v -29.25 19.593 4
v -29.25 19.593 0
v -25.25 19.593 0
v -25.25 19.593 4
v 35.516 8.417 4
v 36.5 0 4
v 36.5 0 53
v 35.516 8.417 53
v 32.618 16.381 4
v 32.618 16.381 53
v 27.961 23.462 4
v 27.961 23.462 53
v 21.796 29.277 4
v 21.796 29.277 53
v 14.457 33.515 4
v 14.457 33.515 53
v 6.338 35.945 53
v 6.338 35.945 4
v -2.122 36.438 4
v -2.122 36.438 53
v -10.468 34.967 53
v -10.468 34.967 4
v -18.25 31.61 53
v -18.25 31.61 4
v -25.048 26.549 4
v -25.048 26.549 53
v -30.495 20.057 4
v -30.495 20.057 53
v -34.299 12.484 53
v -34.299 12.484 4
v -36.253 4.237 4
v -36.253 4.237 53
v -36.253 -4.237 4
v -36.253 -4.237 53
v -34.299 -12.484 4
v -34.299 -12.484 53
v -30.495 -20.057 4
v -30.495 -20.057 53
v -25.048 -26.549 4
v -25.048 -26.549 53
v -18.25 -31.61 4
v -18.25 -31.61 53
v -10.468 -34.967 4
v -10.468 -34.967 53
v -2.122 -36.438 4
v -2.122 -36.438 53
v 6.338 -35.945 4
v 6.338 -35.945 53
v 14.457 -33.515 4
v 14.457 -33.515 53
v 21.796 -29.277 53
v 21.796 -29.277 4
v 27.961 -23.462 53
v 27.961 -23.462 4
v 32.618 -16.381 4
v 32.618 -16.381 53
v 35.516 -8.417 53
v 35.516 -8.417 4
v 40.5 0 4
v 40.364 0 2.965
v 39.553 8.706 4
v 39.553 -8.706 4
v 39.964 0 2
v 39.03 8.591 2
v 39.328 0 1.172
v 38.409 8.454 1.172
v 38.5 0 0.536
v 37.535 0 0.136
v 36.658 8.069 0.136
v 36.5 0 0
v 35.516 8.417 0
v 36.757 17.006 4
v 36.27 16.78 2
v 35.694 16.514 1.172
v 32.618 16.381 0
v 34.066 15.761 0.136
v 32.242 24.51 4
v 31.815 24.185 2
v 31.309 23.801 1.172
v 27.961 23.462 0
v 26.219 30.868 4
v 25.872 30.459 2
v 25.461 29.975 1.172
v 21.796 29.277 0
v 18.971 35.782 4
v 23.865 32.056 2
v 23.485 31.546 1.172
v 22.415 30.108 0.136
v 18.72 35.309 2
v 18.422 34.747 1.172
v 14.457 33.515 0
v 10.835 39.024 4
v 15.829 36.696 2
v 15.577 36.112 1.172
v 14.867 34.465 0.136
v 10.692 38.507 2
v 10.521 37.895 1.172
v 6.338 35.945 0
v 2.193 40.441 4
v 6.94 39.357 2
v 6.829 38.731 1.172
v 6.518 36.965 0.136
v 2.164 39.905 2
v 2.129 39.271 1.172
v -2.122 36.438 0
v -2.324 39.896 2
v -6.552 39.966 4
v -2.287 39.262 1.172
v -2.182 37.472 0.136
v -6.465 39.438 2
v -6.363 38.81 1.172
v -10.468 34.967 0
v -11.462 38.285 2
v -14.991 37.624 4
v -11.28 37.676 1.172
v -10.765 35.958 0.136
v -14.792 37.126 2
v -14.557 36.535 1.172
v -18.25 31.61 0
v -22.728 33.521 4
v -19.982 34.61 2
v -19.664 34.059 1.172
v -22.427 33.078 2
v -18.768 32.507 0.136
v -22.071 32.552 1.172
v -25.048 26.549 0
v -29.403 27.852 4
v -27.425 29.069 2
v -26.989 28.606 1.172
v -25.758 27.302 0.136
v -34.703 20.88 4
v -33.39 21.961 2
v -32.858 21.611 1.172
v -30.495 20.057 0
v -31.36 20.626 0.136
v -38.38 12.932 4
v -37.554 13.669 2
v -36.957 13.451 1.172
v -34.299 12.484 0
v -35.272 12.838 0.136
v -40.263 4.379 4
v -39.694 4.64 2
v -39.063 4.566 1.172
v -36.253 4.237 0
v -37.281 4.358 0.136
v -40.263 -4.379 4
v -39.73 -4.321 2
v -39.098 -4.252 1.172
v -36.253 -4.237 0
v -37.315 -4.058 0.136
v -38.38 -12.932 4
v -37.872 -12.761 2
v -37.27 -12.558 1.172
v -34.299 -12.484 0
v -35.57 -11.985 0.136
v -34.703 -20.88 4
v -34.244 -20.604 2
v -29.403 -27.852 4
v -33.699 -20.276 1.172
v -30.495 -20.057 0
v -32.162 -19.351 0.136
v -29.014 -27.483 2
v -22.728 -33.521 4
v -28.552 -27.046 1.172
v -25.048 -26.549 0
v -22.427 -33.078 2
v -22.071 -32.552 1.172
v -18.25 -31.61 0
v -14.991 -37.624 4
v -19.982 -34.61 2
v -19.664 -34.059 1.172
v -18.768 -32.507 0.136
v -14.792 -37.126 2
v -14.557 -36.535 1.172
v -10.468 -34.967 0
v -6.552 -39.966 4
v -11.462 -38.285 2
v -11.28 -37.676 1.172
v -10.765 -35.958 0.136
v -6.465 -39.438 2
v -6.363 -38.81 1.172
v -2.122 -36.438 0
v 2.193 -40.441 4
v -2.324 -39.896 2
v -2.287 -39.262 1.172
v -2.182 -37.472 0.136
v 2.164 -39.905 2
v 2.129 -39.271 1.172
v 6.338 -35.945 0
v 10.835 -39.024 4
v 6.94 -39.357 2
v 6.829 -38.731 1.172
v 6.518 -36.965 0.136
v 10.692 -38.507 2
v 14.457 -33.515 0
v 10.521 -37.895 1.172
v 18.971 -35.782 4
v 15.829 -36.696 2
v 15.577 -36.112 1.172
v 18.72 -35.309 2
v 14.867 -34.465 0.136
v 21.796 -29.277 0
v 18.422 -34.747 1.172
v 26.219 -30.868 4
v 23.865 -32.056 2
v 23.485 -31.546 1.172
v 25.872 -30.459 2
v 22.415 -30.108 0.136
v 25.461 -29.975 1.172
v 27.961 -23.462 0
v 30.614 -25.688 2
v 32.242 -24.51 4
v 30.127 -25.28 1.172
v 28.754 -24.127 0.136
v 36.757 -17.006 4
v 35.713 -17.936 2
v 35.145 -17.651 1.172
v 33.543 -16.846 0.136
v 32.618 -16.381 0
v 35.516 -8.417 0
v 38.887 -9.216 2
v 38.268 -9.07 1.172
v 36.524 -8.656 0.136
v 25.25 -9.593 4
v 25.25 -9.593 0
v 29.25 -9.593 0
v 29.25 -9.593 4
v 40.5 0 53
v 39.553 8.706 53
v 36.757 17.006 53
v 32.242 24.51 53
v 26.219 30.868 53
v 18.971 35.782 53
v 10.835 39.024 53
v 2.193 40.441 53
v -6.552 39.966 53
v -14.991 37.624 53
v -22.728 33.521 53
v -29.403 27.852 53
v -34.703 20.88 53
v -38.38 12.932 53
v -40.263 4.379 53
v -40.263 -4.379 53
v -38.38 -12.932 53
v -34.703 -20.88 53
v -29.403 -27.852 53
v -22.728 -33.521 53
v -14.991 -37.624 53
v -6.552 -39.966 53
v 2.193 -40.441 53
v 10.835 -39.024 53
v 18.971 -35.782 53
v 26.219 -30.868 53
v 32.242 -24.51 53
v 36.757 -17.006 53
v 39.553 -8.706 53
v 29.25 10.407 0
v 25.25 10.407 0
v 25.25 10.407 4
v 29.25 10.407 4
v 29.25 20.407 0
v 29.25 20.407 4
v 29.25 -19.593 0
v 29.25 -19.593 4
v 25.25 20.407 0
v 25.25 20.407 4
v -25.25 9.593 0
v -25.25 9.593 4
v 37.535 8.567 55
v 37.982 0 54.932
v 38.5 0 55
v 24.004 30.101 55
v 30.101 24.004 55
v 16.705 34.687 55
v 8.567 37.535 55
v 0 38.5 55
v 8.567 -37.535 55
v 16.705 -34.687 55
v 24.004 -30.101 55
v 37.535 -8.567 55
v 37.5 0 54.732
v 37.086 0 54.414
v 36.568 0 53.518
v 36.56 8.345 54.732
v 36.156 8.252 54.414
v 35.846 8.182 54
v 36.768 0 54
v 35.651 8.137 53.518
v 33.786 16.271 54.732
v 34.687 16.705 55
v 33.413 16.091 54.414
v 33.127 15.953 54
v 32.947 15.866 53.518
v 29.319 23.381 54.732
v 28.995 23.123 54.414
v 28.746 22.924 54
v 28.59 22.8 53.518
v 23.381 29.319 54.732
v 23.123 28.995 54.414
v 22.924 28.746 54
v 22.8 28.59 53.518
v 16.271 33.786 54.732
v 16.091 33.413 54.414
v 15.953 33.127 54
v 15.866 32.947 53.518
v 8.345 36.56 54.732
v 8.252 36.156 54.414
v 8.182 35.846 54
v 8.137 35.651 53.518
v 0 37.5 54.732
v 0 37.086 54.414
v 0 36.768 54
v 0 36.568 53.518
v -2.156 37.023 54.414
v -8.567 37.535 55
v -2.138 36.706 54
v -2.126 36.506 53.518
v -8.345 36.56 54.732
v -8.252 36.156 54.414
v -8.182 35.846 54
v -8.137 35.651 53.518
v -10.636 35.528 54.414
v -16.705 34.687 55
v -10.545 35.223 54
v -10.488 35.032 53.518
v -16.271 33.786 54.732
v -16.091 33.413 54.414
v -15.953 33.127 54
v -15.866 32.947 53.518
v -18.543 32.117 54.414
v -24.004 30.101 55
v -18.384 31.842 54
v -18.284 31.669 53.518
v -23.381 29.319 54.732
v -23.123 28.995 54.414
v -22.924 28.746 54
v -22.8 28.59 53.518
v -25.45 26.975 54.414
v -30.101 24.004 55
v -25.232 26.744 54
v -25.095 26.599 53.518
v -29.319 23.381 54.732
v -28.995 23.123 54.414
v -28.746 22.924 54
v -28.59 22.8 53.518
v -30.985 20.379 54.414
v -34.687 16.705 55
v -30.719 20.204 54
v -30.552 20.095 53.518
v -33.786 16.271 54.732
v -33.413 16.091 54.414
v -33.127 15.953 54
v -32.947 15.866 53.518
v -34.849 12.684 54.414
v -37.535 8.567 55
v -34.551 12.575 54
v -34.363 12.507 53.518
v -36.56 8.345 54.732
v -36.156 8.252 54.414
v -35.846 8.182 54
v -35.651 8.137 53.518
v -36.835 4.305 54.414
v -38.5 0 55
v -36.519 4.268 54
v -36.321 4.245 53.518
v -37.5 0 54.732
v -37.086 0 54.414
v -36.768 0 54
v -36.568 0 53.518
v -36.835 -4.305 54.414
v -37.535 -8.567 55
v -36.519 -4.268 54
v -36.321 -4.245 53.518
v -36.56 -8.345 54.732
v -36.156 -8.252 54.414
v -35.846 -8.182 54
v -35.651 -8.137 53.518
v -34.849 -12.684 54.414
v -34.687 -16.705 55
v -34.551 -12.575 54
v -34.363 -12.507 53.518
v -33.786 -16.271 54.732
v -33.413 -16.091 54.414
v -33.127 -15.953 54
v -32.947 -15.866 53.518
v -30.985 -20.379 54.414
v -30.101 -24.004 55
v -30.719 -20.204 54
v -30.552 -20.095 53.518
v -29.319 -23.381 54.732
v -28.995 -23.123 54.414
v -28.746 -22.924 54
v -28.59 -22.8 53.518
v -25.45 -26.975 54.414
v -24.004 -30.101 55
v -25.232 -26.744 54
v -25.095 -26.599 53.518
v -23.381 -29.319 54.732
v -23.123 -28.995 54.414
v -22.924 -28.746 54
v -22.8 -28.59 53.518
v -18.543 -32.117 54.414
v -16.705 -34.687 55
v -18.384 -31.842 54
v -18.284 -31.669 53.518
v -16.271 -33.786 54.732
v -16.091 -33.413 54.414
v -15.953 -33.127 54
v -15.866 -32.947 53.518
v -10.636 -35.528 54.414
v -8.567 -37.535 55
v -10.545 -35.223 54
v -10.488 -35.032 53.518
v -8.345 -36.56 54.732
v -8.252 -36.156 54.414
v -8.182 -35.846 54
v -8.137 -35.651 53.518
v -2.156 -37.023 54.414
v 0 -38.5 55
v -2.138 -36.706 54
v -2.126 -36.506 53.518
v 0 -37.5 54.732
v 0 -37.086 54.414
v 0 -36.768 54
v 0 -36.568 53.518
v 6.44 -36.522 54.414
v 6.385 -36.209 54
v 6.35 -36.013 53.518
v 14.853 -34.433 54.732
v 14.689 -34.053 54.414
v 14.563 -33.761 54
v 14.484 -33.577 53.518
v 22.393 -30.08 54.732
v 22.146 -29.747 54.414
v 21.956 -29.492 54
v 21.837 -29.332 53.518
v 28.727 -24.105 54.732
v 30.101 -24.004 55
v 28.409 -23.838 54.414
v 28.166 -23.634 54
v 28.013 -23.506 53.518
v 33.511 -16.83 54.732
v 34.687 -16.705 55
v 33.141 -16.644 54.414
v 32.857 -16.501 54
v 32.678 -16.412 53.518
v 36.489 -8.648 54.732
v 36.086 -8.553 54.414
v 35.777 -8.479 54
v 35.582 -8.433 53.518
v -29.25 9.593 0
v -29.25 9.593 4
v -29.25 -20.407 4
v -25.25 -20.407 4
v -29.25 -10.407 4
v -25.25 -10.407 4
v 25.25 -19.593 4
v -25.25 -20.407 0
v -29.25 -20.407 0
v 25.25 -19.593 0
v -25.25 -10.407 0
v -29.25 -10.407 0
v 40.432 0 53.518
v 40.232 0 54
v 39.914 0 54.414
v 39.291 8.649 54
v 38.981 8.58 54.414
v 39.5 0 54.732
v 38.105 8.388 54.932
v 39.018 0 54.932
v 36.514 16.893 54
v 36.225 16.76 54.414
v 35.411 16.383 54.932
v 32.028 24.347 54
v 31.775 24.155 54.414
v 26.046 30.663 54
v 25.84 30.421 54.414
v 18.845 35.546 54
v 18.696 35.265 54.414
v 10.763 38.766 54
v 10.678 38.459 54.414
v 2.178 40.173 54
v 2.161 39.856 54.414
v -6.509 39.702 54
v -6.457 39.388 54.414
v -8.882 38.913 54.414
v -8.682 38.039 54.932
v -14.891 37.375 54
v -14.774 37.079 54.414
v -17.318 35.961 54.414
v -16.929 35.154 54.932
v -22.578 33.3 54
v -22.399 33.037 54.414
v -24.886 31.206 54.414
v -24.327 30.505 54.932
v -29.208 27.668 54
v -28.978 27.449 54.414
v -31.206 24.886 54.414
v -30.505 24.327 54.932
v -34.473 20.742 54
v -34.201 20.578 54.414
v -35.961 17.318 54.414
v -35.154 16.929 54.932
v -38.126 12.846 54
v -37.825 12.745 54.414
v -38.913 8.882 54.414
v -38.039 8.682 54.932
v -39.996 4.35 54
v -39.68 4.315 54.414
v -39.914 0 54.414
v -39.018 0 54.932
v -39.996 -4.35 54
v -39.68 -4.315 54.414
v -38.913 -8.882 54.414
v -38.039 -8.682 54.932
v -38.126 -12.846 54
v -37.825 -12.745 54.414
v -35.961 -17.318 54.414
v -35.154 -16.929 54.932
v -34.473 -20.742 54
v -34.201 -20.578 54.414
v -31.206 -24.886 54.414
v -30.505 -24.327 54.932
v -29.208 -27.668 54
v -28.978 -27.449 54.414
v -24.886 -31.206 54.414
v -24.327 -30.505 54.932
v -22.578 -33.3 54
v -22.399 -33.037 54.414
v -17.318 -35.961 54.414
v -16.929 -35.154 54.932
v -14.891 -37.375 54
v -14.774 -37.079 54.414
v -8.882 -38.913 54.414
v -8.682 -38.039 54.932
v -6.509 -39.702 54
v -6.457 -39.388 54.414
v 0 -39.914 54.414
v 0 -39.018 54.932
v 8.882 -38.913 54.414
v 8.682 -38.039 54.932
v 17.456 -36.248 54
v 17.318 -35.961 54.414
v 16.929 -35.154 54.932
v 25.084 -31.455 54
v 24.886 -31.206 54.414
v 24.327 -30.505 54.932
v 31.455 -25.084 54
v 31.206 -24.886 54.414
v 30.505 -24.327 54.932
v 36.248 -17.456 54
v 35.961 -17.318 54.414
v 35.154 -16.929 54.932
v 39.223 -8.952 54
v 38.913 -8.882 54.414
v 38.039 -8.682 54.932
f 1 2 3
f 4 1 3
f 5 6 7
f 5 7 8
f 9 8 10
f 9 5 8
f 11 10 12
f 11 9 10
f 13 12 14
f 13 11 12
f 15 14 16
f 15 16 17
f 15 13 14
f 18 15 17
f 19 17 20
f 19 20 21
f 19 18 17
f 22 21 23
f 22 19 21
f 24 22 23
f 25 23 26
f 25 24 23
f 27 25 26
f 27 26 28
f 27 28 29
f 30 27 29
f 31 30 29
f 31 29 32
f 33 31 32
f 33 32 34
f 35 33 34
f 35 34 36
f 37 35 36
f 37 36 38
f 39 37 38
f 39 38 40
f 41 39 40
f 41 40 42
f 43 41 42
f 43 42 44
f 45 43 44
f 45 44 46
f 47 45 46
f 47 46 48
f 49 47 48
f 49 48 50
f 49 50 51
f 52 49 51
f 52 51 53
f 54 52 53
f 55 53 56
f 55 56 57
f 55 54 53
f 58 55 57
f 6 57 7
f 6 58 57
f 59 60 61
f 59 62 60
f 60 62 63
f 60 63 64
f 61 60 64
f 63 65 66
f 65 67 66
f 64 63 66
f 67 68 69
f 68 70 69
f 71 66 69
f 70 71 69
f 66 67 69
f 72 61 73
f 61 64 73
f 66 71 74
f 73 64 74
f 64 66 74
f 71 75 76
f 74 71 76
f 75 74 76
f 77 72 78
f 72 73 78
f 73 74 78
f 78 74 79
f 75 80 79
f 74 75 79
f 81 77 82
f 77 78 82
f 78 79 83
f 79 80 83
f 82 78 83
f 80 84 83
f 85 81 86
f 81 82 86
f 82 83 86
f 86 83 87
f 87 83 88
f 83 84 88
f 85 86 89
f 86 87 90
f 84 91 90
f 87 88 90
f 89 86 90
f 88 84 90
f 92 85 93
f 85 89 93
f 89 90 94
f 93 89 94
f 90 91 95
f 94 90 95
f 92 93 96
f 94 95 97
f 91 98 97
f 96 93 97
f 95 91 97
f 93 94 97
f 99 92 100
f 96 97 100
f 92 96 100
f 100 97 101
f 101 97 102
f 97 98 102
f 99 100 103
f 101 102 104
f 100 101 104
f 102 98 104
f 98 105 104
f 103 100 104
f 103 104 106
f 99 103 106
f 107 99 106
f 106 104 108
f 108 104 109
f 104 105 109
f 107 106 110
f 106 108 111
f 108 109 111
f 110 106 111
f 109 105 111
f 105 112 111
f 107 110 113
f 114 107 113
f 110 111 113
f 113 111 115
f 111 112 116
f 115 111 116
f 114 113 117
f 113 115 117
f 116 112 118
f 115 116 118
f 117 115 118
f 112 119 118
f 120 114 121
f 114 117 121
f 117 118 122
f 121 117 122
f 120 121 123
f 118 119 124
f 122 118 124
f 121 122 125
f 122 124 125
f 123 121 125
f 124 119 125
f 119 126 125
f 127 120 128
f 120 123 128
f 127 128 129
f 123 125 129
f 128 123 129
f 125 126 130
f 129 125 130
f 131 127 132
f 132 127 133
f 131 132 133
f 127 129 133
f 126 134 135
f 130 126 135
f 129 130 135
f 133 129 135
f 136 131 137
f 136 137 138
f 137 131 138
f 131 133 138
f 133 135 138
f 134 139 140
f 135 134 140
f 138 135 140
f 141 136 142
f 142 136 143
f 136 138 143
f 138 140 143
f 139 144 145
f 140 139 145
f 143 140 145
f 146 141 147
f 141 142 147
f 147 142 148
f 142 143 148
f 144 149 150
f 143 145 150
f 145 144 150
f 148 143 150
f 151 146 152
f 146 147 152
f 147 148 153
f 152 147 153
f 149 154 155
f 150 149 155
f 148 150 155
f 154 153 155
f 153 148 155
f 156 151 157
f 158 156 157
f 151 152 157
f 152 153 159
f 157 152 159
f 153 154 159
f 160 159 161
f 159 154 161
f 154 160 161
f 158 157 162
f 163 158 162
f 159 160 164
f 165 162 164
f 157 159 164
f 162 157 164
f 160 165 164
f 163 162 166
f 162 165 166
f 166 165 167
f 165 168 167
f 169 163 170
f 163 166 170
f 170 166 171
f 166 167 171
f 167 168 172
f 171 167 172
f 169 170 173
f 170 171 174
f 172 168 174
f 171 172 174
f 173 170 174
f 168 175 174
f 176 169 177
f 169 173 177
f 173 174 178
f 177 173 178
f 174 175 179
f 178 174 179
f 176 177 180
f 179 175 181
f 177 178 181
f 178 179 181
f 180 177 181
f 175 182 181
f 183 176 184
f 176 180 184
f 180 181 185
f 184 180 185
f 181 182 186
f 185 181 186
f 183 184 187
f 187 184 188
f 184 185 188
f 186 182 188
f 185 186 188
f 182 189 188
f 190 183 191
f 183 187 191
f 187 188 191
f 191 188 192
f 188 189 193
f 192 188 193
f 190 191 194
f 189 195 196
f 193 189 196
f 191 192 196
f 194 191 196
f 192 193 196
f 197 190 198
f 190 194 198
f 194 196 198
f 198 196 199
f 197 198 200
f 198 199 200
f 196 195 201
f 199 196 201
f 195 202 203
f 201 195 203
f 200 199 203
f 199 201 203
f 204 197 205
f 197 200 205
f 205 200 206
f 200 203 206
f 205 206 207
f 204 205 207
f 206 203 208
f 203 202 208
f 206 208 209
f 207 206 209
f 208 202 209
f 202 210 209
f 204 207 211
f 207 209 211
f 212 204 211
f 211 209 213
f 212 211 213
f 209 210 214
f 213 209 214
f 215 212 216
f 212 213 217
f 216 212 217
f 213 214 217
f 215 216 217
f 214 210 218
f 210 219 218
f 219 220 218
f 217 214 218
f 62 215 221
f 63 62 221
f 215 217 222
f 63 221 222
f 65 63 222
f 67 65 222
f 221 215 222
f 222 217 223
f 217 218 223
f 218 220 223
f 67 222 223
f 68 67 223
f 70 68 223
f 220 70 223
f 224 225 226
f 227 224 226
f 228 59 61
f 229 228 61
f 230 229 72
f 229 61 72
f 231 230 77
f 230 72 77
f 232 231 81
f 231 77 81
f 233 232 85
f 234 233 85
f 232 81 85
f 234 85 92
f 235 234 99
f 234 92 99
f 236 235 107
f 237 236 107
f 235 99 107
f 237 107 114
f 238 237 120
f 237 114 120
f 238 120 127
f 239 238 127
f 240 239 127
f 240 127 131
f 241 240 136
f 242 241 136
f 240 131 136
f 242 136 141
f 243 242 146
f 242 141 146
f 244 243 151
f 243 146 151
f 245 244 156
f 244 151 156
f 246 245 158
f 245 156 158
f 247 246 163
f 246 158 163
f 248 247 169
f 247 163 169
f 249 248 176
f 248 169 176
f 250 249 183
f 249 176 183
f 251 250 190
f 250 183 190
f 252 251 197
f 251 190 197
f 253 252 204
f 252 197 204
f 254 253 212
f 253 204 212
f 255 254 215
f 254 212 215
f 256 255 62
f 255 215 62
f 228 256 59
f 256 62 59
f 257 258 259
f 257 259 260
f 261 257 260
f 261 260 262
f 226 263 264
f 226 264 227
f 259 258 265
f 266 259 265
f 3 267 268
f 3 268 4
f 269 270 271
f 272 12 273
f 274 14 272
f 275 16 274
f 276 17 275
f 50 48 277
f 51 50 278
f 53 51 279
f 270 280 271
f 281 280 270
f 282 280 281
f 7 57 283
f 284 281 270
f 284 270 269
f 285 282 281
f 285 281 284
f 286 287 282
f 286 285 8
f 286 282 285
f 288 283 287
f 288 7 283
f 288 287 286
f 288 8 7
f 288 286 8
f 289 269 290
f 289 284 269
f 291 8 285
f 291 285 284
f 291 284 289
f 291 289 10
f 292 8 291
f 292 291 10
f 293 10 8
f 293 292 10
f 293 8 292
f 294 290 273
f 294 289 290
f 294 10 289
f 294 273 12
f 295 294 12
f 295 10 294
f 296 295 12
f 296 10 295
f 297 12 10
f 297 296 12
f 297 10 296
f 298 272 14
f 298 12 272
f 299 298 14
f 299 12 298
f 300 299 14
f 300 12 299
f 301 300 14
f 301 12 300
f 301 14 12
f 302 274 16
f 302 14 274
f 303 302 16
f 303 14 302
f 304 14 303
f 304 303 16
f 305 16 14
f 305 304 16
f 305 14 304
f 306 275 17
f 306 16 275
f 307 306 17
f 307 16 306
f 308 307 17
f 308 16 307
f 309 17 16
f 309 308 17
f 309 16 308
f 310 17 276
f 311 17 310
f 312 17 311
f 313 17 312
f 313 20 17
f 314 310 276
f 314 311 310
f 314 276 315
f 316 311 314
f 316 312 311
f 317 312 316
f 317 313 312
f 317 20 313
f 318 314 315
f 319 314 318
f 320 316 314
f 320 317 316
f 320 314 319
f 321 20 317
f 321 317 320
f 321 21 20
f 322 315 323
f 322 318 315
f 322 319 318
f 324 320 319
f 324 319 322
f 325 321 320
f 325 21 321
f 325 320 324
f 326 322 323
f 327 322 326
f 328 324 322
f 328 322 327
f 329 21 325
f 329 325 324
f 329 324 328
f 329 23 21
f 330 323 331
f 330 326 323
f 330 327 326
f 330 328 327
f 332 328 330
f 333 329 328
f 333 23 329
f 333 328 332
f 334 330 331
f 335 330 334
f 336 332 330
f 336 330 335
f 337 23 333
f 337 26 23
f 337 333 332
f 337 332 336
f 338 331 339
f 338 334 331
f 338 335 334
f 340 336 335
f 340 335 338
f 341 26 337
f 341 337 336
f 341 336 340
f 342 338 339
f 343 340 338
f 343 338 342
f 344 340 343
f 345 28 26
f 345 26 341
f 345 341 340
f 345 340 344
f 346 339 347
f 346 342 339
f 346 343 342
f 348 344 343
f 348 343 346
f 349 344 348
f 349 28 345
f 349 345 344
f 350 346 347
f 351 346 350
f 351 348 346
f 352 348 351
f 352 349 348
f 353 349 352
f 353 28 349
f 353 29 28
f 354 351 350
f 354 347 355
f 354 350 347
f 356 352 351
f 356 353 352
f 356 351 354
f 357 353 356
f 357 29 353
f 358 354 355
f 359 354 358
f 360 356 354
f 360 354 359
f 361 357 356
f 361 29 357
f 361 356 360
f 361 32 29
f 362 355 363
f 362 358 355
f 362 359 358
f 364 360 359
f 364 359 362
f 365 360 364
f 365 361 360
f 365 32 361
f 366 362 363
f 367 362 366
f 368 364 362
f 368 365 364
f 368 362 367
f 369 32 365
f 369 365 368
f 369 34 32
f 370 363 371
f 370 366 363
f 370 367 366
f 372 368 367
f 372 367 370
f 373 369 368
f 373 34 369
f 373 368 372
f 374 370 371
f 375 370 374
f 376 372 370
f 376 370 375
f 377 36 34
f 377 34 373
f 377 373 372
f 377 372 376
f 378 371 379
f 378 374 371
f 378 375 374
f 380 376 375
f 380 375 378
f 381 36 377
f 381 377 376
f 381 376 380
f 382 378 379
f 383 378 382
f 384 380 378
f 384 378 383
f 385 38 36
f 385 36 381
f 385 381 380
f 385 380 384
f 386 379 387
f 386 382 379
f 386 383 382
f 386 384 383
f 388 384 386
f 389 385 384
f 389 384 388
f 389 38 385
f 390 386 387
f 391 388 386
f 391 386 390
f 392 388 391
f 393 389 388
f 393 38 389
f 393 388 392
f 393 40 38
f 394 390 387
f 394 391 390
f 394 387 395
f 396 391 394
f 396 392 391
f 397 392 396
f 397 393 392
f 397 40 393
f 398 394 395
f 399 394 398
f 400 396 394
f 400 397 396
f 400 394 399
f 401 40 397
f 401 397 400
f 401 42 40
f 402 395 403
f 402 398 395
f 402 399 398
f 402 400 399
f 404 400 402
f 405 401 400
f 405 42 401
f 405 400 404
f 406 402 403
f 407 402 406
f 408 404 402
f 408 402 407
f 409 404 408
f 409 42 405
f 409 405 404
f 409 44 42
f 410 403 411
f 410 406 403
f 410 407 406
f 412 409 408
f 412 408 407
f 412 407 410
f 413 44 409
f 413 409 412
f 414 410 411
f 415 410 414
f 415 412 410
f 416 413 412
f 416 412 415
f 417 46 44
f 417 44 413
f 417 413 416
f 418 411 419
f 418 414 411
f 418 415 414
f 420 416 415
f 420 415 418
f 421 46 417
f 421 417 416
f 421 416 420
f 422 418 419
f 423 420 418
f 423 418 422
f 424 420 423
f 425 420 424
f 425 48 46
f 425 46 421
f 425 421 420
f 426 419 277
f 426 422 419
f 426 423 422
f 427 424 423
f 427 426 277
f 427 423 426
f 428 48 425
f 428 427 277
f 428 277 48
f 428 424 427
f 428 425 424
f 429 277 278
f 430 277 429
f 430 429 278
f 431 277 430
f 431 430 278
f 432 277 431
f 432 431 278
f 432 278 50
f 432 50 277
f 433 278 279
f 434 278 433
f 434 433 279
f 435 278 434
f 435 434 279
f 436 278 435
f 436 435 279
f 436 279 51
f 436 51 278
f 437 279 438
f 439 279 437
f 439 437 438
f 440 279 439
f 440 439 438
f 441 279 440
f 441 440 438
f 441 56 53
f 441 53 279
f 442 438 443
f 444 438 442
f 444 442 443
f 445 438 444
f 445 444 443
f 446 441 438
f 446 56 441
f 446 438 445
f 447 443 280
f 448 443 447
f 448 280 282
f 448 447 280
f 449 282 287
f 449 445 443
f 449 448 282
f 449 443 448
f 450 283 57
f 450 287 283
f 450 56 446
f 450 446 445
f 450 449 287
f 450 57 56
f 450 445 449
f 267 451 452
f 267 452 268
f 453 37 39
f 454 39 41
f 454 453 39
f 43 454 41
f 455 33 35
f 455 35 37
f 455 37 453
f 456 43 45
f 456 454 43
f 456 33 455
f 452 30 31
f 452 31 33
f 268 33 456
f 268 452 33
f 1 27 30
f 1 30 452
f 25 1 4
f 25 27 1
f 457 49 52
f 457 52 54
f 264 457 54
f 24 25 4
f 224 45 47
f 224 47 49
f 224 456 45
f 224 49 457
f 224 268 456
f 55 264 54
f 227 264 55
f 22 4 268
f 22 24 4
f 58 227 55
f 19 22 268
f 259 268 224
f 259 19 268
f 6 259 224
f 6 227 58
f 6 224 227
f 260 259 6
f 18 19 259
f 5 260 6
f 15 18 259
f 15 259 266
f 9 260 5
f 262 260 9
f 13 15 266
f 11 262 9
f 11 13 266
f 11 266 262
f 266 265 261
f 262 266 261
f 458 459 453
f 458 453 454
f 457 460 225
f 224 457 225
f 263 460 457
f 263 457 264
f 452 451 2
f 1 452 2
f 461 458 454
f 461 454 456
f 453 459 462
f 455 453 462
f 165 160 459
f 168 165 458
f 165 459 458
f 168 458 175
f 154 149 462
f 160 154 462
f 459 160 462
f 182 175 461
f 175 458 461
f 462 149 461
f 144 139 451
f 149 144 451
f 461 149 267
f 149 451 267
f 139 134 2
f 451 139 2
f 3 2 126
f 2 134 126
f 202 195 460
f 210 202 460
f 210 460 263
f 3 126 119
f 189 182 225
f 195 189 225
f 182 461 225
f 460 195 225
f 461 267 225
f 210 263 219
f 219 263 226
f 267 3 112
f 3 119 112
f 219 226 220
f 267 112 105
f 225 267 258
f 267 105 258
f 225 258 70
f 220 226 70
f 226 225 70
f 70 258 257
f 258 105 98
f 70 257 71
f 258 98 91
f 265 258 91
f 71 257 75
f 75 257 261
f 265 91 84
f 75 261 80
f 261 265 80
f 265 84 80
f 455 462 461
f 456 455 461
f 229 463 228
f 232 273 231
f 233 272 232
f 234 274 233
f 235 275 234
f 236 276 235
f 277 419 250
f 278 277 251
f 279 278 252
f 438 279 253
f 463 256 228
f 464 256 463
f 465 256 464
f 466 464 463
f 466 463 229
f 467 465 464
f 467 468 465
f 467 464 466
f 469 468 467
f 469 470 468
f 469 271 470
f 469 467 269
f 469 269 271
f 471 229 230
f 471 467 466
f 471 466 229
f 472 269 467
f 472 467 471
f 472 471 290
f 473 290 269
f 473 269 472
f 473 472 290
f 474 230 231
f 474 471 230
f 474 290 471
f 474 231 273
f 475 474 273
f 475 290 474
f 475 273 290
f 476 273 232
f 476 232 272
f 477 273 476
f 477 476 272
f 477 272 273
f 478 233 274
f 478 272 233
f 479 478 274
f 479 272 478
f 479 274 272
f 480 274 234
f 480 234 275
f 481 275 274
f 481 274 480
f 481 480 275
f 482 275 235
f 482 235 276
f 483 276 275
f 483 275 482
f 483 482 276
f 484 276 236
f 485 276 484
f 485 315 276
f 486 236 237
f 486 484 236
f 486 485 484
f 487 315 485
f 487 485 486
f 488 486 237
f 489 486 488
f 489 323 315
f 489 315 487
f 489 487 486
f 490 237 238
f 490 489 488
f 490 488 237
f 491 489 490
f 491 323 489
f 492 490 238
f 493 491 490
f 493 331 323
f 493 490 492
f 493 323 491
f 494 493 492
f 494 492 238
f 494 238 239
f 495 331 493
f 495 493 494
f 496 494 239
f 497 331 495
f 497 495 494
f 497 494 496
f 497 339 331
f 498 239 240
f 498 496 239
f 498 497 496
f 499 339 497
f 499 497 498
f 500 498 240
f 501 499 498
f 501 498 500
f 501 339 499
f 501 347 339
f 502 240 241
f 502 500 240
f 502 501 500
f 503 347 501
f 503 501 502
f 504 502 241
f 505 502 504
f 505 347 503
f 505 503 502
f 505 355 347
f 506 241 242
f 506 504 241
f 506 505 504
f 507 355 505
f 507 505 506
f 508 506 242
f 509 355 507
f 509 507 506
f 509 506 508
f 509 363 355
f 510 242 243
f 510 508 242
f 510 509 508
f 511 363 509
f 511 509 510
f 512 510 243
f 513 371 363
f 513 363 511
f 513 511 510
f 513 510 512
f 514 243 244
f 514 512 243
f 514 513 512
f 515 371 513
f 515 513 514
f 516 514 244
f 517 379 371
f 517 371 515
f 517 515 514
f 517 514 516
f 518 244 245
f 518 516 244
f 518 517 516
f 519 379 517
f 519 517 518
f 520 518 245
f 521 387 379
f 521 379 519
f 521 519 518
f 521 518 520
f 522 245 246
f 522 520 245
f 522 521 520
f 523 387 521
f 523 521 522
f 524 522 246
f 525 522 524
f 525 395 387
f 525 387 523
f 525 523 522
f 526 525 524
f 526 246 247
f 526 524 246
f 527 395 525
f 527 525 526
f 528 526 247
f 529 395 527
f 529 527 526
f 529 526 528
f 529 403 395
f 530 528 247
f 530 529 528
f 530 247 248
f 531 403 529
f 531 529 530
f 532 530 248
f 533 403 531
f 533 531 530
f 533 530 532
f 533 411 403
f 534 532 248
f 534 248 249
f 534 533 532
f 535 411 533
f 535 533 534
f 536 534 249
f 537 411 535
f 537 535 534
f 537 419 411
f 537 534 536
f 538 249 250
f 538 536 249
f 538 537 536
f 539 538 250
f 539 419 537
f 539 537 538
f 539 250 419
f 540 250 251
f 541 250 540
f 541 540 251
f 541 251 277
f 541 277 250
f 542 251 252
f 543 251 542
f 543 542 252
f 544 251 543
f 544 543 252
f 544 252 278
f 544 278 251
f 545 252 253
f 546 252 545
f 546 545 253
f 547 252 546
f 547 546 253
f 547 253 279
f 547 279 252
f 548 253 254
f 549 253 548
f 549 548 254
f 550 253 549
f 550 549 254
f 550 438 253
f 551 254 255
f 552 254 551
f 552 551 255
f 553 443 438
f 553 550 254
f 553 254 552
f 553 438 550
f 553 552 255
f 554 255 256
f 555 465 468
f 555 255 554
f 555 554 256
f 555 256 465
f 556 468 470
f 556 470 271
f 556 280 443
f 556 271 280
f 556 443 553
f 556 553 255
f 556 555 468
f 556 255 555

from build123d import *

# Parameters (mm, degrees)
F0_R     = 36.5
F0_W     = 4
F0_H     = 10
F1_DEPTH = 4
F0_R_2   = 40.5
F2_DEPTH = 55
F3_R     = 1.99999
F4_R     = 4


# Not quite as in the source:
# - a fillet or chamfer is up to 0.001 mm smaller than in the source, because OpenCascade refuses the exact size


with BuildPart() as f1:
    # F0 (on Top) → F1 (new body)
    with BuildSketch(Plane.XY):
        Circle(F0_R)
        with Locations((-27.25, -15.4073267064)):
            Rectangle(F0_W, F0_H, mode=Mode.SUBTRACT)
        with Locations((27.25, -14.5926732936)):
            Rectangle(F0_W, F0_H, mode=Mode.SUBTRACT)
        with Locations((-27.25, 14.5926732936)):
            Rectangle(F0_W, F0_H, mode=Mode.SUBTRACT)
        with Locations((27.25, 15.4073267064)):
            Rectangle(F0_W, F0_H, mode=Mode.SUBTRACT)
    extrude(amount=F1_DEPTH)

    # F0 (on Top) → F2 (join)
    with BuildSketch(Plane.XY):
        Circle(F0_R_2)
        Circle(F0_R, mode=Mode.SUBTRACT)
    extrude(amount=F2_DEPTH)

    # F3 (radius 2 in the source; OpenCascade refuses exactly that, so slightly less here)
    f3_edges = [f1.edges().sort_by_distance(p)[0] for p in [
        (-40.5, 0, 55),
        (-36.5, 0, 55),
    ]]
    fillet(f3_edges, radius=F3_R)

    # F4
    f4_edges = [f1.edges().sort_by_distance(p)[0] for p in [
        (-40.5, 0, 0),
    ]]
    fillet(f4_edges, radius=F4_R)


solid = f1.part
